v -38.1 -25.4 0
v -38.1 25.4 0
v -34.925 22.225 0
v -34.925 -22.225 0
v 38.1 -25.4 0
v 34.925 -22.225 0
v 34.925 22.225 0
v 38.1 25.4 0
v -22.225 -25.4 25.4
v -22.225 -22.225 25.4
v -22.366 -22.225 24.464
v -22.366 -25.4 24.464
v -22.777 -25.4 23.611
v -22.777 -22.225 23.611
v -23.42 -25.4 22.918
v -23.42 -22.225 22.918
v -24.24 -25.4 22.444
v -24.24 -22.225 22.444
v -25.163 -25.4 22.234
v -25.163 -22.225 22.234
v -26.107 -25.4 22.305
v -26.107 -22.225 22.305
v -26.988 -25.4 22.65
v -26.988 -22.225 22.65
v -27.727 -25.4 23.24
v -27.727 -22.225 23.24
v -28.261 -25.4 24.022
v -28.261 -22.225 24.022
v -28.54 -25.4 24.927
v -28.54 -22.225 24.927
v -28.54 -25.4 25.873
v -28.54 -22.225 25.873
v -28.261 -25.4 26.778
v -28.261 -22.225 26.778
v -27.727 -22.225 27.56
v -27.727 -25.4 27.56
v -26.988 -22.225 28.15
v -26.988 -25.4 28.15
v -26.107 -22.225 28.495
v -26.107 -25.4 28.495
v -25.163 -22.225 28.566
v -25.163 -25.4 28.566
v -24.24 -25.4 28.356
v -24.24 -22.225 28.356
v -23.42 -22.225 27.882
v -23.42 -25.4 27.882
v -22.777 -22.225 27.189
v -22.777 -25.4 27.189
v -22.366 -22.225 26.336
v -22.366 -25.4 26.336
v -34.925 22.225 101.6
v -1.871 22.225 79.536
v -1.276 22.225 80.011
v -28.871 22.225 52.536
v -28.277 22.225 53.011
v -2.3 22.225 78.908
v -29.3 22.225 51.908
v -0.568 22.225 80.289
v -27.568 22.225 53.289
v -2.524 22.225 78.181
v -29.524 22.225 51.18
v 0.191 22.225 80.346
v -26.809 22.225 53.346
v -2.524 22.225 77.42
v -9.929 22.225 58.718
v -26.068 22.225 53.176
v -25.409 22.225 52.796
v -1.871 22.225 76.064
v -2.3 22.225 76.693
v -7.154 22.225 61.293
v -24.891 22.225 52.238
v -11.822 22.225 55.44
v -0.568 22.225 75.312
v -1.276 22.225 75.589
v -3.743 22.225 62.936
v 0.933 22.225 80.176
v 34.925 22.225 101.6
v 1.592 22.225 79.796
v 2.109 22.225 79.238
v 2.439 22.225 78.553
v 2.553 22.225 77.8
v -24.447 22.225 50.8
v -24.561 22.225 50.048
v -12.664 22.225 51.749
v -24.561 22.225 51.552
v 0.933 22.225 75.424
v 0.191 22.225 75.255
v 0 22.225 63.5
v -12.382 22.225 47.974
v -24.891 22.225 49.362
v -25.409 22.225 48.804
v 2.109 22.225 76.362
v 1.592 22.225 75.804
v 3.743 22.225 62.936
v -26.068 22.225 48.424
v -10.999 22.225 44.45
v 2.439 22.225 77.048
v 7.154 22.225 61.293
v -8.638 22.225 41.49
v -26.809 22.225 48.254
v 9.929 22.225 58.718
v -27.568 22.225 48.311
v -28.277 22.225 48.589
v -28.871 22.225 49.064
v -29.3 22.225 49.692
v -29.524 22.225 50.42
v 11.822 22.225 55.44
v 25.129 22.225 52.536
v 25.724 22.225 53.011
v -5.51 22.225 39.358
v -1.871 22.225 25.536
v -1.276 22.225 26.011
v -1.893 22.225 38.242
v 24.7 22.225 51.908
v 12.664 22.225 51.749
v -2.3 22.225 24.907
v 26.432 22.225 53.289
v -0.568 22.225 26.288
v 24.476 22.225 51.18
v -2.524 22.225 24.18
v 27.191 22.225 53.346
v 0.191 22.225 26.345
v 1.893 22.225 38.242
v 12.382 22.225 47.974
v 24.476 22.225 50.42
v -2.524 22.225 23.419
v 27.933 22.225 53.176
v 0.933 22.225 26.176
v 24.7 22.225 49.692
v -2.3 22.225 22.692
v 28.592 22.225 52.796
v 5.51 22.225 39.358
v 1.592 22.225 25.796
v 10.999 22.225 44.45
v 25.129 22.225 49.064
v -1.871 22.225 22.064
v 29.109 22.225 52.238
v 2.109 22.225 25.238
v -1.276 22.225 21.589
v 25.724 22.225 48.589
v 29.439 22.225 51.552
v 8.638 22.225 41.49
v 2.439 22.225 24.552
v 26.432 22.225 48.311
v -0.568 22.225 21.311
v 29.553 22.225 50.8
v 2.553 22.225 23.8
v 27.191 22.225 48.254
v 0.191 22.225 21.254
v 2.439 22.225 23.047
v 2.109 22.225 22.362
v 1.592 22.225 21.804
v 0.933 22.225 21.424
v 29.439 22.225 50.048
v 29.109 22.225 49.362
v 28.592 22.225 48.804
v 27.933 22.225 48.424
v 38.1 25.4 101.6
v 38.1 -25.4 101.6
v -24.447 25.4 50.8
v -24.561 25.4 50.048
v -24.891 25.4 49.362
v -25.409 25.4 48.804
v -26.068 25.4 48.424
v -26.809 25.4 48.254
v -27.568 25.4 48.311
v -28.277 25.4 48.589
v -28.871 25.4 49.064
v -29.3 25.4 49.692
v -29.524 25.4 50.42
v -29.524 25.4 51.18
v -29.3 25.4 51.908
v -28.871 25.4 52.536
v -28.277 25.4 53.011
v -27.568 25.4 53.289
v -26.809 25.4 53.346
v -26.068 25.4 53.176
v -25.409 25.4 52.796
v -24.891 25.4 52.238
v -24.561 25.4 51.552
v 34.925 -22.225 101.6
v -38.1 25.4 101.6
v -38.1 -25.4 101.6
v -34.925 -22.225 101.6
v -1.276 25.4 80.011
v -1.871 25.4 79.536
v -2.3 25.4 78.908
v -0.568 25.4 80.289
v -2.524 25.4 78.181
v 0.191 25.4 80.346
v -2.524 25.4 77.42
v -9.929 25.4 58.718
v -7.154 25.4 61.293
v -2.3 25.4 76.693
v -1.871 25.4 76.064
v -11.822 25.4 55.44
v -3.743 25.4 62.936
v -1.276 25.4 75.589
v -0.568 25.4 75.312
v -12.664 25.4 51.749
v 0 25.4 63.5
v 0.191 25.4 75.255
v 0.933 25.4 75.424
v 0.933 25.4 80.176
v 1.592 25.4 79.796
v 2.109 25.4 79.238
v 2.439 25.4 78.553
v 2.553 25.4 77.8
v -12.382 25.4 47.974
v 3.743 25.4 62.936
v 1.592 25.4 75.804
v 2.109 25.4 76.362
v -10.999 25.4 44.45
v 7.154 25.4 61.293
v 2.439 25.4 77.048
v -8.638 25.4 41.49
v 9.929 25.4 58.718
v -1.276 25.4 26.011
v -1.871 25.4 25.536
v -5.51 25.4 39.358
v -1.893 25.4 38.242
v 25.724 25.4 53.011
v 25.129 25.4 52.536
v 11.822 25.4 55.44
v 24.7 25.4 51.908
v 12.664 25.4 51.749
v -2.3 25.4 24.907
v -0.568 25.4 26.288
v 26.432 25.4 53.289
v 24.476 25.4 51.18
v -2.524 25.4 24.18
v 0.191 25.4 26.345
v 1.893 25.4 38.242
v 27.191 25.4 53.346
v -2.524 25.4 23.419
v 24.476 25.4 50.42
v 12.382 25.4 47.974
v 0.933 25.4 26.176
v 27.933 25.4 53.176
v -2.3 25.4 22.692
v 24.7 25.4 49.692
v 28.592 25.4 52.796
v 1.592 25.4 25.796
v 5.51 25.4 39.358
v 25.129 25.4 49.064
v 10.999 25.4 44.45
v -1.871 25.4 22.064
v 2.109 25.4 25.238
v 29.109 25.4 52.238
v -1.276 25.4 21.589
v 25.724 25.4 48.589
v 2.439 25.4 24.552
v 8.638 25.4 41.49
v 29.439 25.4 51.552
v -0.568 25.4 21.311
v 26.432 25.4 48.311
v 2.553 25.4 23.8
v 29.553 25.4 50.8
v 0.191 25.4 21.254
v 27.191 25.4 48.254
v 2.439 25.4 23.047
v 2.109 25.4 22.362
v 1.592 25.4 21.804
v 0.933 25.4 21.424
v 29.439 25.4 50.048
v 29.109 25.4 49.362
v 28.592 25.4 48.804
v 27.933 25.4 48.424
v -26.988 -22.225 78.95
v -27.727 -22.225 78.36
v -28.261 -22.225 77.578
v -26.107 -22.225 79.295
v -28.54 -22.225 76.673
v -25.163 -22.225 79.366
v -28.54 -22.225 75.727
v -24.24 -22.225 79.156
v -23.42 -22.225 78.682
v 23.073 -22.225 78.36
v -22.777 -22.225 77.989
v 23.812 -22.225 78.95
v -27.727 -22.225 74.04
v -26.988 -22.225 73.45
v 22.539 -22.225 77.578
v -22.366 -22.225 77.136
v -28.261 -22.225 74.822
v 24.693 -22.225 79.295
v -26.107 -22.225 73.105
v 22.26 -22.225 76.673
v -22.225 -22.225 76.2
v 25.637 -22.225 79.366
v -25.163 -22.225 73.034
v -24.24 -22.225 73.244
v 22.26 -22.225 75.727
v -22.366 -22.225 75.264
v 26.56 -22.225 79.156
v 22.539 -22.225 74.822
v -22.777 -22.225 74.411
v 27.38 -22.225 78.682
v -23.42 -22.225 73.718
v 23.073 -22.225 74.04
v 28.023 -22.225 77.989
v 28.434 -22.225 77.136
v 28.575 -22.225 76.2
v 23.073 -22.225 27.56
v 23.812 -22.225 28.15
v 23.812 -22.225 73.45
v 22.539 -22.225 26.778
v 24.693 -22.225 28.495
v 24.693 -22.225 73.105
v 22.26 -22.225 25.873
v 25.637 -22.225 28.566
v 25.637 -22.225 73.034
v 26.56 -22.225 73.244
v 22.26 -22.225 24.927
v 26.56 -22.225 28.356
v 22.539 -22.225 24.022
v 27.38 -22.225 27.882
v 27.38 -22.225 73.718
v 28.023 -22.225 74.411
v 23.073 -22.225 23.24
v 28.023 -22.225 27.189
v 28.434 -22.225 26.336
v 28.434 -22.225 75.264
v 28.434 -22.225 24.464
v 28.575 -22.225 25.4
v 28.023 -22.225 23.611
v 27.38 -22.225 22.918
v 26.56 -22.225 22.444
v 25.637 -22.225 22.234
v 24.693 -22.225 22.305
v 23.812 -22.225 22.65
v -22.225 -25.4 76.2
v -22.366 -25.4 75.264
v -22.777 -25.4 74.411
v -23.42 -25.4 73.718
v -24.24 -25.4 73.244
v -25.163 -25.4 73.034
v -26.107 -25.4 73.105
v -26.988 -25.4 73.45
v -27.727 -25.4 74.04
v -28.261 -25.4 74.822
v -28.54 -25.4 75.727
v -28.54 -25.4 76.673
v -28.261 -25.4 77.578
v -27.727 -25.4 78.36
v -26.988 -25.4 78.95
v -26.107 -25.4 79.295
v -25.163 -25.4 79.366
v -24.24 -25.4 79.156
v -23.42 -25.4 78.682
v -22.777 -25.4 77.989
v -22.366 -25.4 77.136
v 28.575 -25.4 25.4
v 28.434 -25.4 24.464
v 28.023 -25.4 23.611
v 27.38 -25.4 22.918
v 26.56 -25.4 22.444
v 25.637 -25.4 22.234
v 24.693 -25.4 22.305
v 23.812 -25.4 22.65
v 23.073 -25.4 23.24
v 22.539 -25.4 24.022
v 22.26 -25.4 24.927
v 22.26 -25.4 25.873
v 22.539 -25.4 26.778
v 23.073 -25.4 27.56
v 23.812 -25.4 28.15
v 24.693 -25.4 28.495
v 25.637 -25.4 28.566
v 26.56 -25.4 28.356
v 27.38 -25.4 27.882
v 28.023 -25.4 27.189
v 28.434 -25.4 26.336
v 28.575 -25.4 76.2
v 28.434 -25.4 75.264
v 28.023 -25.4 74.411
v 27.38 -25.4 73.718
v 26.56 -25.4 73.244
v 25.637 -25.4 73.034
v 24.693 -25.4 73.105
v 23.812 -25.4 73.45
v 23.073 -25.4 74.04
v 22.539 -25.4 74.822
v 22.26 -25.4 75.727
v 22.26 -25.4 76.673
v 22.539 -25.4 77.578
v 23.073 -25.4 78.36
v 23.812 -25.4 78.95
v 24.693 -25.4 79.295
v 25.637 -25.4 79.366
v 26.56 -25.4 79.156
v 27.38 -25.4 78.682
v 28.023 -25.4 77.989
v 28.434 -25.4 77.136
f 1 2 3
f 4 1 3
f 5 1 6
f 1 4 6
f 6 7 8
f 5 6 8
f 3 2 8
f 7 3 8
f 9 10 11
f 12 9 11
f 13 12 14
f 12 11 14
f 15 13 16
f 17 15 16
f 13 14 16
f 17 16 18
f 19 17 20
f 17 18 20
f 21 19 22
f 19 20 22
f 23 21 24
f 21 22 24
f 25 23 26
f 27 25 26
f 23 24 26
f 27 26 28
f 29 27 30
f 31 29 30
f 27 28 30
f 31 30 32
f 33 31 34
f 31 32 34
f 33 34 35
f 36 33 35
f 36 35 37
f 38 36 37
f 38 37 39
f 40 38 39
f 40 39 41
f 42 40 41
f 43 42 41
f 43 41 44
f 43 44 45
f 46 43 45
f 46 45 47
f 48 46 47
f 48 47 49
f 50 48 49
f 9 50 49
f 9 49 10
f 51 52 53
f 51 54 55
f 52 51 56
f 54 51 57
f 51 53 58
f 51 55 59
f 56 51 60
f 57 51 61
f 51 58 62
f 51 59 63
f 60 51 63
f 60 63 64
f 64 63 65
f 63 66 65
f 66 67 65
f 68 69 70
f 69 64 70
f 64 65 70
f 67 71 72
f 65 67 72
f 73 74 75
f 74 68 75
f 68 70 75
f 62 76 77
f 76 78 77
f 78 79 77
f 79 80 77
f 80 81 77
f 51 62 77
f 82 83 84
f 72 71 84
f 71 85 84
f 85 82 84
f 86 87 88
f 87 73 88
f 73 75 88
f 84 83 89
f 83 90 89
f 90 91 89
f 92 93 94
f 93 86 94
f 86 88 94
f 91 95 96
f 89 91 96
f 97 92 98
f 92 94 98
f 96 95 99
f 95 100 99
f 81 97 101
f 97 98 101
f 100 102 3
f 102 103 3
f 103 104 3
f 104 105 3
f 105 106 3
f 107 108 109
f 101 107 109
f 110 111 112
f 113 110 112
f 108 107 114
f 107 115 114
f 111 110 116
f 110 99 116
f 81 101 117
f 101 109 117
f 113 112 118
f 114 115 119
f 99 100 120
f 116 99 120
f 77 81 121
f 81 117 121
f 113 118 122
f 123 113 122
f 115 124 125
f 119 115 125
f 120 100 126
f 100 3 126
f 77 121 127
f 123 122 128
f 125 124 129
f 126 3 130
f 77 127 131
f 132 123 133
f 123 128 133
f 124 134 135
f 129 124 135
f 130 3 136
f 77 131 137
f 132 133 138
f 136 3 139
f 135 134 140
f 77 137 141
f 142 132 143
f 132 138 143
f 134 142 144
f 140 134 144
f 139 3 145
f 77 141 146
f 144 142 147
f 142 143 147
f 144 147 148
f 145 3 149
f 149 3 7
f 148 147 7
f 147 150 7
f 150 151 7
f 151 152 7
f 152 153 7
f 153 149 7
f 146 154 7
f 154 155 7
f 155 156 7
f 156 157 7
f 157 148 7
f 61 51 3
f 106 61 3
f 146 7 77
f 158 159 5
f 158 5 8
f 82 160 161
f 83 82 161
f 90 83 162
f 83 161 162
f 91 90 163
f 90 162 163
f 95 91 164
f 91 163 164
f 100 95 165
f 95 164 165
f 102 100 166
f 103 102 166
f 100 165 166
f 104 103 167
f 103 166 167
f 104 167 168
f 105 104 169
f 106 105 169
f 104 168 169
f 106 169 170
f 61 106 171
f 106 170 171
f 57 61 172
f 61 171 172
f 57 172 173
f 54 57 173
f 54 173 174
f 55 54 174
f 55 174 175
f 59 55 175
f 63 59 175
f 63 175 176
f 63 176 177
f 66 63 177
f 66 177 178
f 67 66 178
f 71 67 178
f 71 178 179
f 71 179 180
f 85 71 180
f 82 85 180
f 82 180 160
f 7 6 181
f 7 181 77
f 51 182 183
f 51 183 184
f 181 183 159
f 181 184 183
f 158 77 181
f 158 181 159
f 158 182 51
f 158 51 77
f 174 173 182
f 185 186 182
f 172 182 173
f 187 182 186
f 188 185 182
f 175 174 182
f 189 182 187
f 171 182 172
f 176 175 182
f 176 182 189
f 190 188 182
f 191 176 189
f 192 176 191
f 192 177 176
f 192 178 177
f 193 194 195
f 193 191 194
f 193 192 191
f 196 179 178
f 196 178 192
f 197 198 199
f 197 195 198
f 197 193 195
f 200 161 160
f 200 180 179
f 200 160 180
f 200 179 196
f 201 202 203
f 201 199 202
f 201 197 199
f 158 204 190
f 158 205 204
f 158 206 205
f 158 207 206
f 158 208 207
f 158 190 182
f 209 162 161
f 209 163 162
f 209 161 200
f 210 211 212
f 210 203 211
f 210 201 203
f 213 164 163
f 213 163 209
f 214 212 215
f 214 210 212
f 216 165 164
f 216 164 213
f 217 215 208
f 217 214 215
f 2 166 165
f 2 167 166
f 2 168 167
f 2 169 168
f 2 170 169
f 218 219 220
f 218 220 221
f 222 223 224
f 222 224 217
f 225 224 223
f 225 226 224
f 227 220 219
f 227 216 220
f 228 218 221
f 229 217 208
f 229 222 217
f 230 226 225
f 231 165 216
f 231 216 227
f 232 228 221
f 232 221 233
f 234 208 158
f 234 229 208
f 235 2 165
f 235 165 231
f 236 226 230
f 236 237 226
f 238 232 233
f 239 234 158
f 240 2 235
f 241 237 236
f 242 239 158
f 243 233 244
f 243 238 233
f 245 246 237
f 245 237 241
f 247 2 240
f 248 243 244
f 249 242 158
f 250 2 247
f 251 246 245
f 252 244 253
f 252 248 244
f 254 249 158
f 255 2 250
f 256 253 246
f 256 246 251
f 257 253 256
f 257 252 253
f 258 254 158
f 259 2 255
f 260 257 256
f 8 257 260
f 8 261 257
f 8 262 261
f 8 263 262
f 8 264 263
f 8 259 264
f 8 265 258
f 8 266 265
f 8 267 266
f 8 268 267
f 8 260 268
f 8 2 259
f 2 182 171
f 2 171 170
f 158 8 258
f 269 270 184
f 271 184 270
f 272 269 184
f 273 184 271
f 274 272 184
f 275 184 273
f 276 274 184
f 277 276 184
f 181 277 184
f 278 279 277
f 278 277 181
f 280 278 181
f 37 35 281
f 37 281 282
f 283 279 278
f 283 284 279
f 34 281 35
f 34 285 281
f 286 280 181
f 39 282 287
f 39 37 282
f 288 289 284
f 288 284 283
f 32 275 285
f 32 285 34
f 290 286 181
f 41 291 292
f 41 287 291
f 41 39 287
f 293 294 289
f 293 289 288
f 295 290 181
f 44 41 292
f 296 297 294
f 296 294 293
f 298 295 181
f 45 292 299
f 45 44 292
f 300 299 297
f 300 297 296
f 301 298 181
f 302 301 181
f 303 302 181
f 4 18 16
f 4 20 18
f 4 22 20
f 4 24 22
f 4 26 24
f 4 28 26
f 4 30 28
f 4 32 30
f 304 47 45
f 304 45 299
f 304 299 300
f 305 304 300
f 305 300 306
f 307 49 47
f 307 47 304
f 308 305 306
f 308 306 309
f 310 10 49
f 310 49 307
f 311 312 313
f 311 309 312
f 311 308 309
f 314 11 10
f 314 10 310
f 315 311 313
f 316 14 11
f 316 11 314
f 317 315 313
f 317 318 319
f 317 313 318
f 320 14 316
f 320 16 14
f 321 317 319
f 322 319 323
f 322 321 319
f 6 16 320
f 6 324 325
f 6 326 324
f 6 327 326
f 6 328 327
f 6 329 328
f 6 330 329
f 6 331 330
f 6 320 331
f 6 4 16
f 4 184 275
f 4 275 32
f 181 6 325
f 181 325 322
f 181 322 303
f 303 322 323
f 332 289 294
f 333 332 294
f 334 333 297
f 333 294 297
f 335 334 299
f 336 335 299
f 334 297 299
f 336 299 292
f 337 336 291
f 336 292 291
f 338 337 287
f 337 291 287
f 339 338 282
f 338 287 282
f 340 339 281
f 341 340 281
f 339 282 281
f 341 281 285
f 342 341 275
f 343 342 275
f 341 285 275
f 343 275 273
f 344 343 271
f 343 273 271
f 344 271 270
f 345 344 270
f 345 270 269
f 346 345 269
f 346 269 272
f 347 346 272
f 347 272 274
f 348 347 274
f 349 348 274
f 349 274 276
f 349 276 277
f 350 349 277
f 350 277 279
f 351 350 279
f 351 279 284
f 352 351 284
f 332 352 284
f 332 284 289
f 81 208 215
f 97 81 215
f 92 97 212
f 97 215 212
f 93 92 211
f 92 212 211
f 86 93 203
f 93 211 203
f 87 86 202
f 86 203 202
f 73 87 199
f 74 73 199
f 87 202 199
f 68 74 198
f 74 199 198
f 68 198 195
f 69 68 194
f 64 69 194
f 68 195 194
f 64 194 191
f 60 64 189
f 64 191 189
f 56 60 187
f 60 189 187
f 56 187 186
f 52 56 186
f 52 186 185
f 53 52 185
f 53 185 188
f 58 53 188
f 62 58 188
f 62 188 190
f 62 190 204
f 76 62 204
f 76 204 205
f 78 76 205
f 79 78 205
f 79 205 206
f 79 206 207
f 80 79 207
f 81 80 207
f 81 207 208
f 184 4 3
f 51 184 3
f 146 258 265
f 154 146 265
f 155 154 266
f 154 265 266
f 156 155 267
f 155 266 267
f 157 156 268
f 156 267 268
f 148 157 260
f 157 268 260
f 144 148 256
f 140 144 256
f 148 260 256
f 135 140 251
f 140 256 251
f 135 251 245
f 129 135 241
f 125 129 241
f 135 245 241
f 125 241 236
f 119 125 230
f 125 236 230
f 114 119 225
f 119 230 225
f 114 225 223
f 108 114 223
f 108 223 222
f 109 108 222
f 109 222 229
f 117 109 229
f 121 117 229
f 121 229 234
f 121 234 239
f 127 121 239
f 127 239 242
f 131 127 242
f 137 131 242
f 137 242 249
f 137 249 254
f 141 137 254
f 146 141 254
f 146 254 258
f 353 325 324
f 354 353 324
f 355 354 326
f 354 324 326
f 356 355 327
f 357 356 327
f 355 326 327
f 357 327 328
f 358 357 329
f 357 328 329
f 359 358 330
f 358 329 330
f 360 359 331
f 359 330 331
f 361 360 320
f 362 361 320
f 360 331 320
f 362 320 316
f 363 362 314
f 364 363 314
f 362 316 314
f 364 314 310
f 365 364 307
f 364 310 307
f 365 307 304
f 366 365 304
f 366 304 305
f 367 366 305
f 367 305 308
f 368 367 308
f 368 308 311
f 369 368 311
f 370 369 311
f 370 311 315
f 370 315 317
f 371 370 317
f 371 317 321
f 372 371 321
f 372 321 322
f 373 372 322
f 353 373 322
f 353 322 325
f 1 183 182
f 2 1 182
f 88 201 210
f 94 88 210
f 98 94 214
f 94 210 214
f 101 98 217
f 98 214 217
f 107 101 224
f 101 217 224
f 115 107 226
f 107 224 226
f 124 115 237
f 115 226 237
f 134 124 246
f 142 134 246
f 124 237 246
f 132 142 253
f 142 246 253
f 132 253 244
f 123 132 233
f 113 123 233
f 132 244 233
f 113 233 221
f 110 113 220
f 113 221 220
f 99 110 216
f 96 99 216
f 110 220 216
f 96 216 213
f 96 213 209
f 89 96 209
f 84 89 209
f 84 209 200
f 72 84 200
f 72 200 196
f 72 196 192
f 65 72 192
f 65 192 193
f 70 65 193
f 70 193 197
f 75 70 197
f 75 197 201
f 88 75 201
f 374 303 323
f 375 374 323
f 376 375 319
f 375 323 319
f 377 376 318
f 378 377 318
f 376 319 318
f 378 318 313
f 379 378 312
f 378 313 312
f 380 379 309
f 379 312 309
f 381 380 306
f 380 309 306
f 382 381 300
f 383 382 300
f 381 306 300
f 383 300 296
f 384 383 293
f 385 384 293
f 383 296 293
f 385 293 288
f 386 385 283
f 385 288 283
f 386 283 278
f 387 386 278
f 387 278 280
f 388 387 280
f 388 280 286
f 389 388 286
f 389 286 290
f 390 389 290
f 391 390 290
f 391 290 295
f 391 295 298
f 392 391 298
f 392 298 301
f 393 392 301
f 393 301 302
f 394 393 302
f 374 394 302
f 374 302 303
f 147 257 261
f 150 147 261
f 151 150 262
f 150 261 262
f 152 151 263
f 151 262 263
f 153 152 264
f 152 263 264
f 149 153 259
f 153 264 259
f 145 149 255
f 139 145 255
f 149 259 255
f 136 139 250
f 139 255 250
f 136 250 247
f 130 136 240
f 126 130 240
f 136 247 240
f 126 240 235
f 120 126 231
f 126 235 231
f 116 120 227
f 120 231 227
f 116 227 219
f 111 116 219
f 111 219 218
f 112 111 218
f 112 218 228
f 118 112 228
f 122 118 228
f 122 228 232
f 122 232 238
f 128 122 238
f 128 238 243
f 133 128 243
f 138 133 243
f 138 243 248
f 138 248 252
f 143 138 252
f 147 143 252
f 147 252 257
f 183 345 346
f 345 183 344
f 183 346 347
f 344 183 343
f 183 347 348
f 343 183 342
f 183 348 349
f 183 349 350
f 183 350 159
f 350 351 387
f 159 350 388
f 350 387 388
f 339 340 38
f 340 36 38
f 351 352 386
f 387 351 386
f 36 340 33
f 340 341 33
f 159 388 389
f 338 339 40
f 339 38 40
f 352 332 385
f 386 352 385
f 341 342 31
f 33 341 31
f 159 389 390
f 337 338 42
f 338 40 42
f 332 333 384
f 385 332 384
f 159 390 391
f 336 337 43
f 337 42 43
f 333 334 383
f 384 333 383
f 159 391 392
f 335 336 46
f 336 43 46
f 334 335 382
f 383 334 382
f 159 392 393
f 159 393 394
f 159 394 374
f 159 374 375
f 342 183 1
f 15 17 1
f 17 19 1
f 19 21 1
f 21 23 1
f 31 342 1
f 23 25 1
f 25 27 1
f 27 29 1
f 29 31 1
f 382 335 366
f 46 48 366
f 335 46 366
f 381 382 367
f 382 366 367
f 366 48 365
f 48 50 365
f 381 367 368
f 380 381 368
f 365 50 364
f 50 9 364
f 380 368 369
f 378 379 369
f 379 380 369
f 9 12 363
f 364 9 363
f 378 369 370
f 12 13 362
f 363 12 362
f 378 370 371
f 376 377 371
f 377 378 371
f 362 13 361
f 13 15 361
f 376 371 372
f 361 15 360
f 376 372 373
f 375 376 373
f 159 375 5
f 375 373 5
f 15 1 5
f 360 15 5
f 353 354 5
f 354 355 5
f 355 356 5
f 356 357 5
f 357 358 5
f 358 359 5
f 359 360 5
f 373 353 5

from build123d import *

# Parameters (mm, degrees)
SKETCH1_W                       = 76.2
SKETCH1_H                       = 50.8
SKETCH1_W_2                     = 69.85
SKETCH1_H_2                     = 44.45
BOSS_EXTRUDE1_DEPTH             = 101.6
F_7_0_201_DIAMETER_HOLE1_REACH  = 121.812
F_7_0_201_DIAMETER_HOLE1_BORE_R = 2.5527
F_1_4_0_25_DIAMETER_HOLE1_D     = 6.35
F_1_4_0_25_DIAMETER_HOLE1_DEPTH = 3.175
CUT_EXTRUDE1_REACH              = 121.812
SKETCH8_R                       = 12.7


with BuildPart() as part:
    # Sketch1 → Boss-Extrude1 (new body)
    with BuildSketch(Plane.XY):
        Rectangle(SKETCH1_W, SKETCH1_H)
        Rectangle(SKETCH1_W_2, SKETCH1_H_2, mode=Mode.SUBTRACT)
    extrude(amount=BOSS_EXTRUDE1_DEPTH)

    # #7 (0.201) Diameter Hole1 bore → #7 (0.201) Diameter Hole1 (cut, up to next)
    with BuildSketch(Plane(origin=(0, 25.4, 0), x_dir=(1, 0, 0), z_dir=(0, 1, 0)), mode=Mode.PRIVATE) as f_7_0_201_diameter_hole1_sk1:
        with Locations((-27.0002, -50.8)):
            Circle(F_7_0_201_DIAMETER_HOLE1_BORE_R)
    f_7_0_201_diameter_hole1_tool1 = extrude(f_7_0_201_diameter_hole1_sk1.sketch, amount=-F_7_0_201_DIAMETER_HOLE1_REACH, mode=Mode.PRIVATE) & part.part
    # #7 (0.201) Diameter Hole1 bore → #7 (0.201) Diameter Hole1 (cut, up to next)
    with BuildSketch(Plane(origin=(0, 25.4, 0), x_dir=(1, 0, 0), z_dir=(0, 1, 0)), mode=Mode.PRIVATE) as f_7_0_201_diameter_hole1_sk2:
        with Locations((0, -23.7998)):
            Circle(F_7_0_201_DIAMETER_HOLE1_BORE_R)
    f_7_0_201_diameter_hole1_tool2 = extrude(f_7_0_201_diameter_hole1_sk2.sketch, amount=-F_7_0_201_DIAMETER_HOLE1_REACH, mode=Mode.PRIVATE) & part.part
    # #7 (0.201) Diameter Hole1 bore → #7 (0.201) Diameter Hole1 (cut, up to next)
    with BuildSketch(Plane(origin=(0, 25.4, 0), x_dir=(1, 0, 0), z_dir=(0, 1, 0)), mode=Mode.PRIVATE) as f_7_0_201_diameter_hole1_sk3:
        with Locations((27.0002, -50.8)):
            Circle(F_7_0_201_DIAMETER_HOLE1_BORE_R)
    f_7_0_201_diameter_hole1_tool3 = extrude(f_7_0_201_diameter_hole1_sk3.sketch, amount=-F_7_0_201_DIAMETER_HOLE1_REACH, mode=Mode.PRIVATE) & part.part
    # #7 (0.201) Diameter Hole1 bore → #7 (0.201) Diameter Hole1 (cut, up to next)
    with BuildSketch(Plane(origin=(0, 25.4, 0), x_dir=(1, 0, 0), z_dir=(0, 1, 0)), mode=Mode.PRIVATE) as f_7_0_201_diameter_hole1_sk4:
        with Locations((0, -77.8002)):
            Circle(F_7_0_201_DIAMETER_HOLE1_BORE_R)
    f_7_0_201_diameter_hole1_tool4 = extrude(f_7_0_201_diameter_hole1_sk4.sketch, amount=-F_7_0_201_DIAMETER_HOLE1_REACH, mode=Mode.PRIVATE) & part.part
    add(f_7_0_201_diameter_hole1_tool1.solids().sort_by_distance((-27.0002, 25.4, 50.8))[0], mode=Mode.SUBTRACT)
    add(f_7_0_201_diameter_hole1_tool2.solids().sort_by_distance((0, 25.4, 23.7998))[0], mode=Mode.SUBTRACT)
    add(f_7_0_201_diameter_hole1_tool3.solids().sort_by_distance((27.0002, 25.4, 50.8))[0], mode=Mode.SUBTRACT)
    add(f_7_0_201_diameter_hole1_tool4.solids().sort_by_distance((0, 25.4, 77.8002))[0], mode=Mode.SUBTRACT)

    # 1/4 (0.25) Diameter Hole1
    with Locations(Plane(origin=(0, -25.4, 0), x_dir=(-1, 0, 0), z_dir=(0, -1, 0))):
        with Locations((25.4, -25.4), (25.4, -76.2), (-25.4, -76.2), (-25.4, -25.4)):
            Hole(F_1_4_0_25_DIAMETER_HOLE1_D / 2, depth=F_1_4_0_25_DIAMETER_HOLE1_DEPTH)

    # Sketch8 → Cut-Extrude1 (cut, up to next)
    with BuildSketch(Plane(origin=(0, 25.4, 0), x_dir=(1, 0, 0), z_dir=(0, 1, 0)), mode=Mode.PRIVATE) as cut_extrude1_sk1:
        with Locations(Location((0, -50.8, 0), (0, 0, 270))):
            Circle(SKETCH8_R)
    cut_extrude1_tool1 = extrude(cut_extrude1_sk1.sketch, amount=-CUT_EXTRUDE1_REACH, mode=Mode.PRIVATE) & part.part
    add(cut_extrude1_tool1.solids().sort_by_distance((0, 25.4, 50.8))[0], mode=Mode.SUBTRACT)


solid = part.part
